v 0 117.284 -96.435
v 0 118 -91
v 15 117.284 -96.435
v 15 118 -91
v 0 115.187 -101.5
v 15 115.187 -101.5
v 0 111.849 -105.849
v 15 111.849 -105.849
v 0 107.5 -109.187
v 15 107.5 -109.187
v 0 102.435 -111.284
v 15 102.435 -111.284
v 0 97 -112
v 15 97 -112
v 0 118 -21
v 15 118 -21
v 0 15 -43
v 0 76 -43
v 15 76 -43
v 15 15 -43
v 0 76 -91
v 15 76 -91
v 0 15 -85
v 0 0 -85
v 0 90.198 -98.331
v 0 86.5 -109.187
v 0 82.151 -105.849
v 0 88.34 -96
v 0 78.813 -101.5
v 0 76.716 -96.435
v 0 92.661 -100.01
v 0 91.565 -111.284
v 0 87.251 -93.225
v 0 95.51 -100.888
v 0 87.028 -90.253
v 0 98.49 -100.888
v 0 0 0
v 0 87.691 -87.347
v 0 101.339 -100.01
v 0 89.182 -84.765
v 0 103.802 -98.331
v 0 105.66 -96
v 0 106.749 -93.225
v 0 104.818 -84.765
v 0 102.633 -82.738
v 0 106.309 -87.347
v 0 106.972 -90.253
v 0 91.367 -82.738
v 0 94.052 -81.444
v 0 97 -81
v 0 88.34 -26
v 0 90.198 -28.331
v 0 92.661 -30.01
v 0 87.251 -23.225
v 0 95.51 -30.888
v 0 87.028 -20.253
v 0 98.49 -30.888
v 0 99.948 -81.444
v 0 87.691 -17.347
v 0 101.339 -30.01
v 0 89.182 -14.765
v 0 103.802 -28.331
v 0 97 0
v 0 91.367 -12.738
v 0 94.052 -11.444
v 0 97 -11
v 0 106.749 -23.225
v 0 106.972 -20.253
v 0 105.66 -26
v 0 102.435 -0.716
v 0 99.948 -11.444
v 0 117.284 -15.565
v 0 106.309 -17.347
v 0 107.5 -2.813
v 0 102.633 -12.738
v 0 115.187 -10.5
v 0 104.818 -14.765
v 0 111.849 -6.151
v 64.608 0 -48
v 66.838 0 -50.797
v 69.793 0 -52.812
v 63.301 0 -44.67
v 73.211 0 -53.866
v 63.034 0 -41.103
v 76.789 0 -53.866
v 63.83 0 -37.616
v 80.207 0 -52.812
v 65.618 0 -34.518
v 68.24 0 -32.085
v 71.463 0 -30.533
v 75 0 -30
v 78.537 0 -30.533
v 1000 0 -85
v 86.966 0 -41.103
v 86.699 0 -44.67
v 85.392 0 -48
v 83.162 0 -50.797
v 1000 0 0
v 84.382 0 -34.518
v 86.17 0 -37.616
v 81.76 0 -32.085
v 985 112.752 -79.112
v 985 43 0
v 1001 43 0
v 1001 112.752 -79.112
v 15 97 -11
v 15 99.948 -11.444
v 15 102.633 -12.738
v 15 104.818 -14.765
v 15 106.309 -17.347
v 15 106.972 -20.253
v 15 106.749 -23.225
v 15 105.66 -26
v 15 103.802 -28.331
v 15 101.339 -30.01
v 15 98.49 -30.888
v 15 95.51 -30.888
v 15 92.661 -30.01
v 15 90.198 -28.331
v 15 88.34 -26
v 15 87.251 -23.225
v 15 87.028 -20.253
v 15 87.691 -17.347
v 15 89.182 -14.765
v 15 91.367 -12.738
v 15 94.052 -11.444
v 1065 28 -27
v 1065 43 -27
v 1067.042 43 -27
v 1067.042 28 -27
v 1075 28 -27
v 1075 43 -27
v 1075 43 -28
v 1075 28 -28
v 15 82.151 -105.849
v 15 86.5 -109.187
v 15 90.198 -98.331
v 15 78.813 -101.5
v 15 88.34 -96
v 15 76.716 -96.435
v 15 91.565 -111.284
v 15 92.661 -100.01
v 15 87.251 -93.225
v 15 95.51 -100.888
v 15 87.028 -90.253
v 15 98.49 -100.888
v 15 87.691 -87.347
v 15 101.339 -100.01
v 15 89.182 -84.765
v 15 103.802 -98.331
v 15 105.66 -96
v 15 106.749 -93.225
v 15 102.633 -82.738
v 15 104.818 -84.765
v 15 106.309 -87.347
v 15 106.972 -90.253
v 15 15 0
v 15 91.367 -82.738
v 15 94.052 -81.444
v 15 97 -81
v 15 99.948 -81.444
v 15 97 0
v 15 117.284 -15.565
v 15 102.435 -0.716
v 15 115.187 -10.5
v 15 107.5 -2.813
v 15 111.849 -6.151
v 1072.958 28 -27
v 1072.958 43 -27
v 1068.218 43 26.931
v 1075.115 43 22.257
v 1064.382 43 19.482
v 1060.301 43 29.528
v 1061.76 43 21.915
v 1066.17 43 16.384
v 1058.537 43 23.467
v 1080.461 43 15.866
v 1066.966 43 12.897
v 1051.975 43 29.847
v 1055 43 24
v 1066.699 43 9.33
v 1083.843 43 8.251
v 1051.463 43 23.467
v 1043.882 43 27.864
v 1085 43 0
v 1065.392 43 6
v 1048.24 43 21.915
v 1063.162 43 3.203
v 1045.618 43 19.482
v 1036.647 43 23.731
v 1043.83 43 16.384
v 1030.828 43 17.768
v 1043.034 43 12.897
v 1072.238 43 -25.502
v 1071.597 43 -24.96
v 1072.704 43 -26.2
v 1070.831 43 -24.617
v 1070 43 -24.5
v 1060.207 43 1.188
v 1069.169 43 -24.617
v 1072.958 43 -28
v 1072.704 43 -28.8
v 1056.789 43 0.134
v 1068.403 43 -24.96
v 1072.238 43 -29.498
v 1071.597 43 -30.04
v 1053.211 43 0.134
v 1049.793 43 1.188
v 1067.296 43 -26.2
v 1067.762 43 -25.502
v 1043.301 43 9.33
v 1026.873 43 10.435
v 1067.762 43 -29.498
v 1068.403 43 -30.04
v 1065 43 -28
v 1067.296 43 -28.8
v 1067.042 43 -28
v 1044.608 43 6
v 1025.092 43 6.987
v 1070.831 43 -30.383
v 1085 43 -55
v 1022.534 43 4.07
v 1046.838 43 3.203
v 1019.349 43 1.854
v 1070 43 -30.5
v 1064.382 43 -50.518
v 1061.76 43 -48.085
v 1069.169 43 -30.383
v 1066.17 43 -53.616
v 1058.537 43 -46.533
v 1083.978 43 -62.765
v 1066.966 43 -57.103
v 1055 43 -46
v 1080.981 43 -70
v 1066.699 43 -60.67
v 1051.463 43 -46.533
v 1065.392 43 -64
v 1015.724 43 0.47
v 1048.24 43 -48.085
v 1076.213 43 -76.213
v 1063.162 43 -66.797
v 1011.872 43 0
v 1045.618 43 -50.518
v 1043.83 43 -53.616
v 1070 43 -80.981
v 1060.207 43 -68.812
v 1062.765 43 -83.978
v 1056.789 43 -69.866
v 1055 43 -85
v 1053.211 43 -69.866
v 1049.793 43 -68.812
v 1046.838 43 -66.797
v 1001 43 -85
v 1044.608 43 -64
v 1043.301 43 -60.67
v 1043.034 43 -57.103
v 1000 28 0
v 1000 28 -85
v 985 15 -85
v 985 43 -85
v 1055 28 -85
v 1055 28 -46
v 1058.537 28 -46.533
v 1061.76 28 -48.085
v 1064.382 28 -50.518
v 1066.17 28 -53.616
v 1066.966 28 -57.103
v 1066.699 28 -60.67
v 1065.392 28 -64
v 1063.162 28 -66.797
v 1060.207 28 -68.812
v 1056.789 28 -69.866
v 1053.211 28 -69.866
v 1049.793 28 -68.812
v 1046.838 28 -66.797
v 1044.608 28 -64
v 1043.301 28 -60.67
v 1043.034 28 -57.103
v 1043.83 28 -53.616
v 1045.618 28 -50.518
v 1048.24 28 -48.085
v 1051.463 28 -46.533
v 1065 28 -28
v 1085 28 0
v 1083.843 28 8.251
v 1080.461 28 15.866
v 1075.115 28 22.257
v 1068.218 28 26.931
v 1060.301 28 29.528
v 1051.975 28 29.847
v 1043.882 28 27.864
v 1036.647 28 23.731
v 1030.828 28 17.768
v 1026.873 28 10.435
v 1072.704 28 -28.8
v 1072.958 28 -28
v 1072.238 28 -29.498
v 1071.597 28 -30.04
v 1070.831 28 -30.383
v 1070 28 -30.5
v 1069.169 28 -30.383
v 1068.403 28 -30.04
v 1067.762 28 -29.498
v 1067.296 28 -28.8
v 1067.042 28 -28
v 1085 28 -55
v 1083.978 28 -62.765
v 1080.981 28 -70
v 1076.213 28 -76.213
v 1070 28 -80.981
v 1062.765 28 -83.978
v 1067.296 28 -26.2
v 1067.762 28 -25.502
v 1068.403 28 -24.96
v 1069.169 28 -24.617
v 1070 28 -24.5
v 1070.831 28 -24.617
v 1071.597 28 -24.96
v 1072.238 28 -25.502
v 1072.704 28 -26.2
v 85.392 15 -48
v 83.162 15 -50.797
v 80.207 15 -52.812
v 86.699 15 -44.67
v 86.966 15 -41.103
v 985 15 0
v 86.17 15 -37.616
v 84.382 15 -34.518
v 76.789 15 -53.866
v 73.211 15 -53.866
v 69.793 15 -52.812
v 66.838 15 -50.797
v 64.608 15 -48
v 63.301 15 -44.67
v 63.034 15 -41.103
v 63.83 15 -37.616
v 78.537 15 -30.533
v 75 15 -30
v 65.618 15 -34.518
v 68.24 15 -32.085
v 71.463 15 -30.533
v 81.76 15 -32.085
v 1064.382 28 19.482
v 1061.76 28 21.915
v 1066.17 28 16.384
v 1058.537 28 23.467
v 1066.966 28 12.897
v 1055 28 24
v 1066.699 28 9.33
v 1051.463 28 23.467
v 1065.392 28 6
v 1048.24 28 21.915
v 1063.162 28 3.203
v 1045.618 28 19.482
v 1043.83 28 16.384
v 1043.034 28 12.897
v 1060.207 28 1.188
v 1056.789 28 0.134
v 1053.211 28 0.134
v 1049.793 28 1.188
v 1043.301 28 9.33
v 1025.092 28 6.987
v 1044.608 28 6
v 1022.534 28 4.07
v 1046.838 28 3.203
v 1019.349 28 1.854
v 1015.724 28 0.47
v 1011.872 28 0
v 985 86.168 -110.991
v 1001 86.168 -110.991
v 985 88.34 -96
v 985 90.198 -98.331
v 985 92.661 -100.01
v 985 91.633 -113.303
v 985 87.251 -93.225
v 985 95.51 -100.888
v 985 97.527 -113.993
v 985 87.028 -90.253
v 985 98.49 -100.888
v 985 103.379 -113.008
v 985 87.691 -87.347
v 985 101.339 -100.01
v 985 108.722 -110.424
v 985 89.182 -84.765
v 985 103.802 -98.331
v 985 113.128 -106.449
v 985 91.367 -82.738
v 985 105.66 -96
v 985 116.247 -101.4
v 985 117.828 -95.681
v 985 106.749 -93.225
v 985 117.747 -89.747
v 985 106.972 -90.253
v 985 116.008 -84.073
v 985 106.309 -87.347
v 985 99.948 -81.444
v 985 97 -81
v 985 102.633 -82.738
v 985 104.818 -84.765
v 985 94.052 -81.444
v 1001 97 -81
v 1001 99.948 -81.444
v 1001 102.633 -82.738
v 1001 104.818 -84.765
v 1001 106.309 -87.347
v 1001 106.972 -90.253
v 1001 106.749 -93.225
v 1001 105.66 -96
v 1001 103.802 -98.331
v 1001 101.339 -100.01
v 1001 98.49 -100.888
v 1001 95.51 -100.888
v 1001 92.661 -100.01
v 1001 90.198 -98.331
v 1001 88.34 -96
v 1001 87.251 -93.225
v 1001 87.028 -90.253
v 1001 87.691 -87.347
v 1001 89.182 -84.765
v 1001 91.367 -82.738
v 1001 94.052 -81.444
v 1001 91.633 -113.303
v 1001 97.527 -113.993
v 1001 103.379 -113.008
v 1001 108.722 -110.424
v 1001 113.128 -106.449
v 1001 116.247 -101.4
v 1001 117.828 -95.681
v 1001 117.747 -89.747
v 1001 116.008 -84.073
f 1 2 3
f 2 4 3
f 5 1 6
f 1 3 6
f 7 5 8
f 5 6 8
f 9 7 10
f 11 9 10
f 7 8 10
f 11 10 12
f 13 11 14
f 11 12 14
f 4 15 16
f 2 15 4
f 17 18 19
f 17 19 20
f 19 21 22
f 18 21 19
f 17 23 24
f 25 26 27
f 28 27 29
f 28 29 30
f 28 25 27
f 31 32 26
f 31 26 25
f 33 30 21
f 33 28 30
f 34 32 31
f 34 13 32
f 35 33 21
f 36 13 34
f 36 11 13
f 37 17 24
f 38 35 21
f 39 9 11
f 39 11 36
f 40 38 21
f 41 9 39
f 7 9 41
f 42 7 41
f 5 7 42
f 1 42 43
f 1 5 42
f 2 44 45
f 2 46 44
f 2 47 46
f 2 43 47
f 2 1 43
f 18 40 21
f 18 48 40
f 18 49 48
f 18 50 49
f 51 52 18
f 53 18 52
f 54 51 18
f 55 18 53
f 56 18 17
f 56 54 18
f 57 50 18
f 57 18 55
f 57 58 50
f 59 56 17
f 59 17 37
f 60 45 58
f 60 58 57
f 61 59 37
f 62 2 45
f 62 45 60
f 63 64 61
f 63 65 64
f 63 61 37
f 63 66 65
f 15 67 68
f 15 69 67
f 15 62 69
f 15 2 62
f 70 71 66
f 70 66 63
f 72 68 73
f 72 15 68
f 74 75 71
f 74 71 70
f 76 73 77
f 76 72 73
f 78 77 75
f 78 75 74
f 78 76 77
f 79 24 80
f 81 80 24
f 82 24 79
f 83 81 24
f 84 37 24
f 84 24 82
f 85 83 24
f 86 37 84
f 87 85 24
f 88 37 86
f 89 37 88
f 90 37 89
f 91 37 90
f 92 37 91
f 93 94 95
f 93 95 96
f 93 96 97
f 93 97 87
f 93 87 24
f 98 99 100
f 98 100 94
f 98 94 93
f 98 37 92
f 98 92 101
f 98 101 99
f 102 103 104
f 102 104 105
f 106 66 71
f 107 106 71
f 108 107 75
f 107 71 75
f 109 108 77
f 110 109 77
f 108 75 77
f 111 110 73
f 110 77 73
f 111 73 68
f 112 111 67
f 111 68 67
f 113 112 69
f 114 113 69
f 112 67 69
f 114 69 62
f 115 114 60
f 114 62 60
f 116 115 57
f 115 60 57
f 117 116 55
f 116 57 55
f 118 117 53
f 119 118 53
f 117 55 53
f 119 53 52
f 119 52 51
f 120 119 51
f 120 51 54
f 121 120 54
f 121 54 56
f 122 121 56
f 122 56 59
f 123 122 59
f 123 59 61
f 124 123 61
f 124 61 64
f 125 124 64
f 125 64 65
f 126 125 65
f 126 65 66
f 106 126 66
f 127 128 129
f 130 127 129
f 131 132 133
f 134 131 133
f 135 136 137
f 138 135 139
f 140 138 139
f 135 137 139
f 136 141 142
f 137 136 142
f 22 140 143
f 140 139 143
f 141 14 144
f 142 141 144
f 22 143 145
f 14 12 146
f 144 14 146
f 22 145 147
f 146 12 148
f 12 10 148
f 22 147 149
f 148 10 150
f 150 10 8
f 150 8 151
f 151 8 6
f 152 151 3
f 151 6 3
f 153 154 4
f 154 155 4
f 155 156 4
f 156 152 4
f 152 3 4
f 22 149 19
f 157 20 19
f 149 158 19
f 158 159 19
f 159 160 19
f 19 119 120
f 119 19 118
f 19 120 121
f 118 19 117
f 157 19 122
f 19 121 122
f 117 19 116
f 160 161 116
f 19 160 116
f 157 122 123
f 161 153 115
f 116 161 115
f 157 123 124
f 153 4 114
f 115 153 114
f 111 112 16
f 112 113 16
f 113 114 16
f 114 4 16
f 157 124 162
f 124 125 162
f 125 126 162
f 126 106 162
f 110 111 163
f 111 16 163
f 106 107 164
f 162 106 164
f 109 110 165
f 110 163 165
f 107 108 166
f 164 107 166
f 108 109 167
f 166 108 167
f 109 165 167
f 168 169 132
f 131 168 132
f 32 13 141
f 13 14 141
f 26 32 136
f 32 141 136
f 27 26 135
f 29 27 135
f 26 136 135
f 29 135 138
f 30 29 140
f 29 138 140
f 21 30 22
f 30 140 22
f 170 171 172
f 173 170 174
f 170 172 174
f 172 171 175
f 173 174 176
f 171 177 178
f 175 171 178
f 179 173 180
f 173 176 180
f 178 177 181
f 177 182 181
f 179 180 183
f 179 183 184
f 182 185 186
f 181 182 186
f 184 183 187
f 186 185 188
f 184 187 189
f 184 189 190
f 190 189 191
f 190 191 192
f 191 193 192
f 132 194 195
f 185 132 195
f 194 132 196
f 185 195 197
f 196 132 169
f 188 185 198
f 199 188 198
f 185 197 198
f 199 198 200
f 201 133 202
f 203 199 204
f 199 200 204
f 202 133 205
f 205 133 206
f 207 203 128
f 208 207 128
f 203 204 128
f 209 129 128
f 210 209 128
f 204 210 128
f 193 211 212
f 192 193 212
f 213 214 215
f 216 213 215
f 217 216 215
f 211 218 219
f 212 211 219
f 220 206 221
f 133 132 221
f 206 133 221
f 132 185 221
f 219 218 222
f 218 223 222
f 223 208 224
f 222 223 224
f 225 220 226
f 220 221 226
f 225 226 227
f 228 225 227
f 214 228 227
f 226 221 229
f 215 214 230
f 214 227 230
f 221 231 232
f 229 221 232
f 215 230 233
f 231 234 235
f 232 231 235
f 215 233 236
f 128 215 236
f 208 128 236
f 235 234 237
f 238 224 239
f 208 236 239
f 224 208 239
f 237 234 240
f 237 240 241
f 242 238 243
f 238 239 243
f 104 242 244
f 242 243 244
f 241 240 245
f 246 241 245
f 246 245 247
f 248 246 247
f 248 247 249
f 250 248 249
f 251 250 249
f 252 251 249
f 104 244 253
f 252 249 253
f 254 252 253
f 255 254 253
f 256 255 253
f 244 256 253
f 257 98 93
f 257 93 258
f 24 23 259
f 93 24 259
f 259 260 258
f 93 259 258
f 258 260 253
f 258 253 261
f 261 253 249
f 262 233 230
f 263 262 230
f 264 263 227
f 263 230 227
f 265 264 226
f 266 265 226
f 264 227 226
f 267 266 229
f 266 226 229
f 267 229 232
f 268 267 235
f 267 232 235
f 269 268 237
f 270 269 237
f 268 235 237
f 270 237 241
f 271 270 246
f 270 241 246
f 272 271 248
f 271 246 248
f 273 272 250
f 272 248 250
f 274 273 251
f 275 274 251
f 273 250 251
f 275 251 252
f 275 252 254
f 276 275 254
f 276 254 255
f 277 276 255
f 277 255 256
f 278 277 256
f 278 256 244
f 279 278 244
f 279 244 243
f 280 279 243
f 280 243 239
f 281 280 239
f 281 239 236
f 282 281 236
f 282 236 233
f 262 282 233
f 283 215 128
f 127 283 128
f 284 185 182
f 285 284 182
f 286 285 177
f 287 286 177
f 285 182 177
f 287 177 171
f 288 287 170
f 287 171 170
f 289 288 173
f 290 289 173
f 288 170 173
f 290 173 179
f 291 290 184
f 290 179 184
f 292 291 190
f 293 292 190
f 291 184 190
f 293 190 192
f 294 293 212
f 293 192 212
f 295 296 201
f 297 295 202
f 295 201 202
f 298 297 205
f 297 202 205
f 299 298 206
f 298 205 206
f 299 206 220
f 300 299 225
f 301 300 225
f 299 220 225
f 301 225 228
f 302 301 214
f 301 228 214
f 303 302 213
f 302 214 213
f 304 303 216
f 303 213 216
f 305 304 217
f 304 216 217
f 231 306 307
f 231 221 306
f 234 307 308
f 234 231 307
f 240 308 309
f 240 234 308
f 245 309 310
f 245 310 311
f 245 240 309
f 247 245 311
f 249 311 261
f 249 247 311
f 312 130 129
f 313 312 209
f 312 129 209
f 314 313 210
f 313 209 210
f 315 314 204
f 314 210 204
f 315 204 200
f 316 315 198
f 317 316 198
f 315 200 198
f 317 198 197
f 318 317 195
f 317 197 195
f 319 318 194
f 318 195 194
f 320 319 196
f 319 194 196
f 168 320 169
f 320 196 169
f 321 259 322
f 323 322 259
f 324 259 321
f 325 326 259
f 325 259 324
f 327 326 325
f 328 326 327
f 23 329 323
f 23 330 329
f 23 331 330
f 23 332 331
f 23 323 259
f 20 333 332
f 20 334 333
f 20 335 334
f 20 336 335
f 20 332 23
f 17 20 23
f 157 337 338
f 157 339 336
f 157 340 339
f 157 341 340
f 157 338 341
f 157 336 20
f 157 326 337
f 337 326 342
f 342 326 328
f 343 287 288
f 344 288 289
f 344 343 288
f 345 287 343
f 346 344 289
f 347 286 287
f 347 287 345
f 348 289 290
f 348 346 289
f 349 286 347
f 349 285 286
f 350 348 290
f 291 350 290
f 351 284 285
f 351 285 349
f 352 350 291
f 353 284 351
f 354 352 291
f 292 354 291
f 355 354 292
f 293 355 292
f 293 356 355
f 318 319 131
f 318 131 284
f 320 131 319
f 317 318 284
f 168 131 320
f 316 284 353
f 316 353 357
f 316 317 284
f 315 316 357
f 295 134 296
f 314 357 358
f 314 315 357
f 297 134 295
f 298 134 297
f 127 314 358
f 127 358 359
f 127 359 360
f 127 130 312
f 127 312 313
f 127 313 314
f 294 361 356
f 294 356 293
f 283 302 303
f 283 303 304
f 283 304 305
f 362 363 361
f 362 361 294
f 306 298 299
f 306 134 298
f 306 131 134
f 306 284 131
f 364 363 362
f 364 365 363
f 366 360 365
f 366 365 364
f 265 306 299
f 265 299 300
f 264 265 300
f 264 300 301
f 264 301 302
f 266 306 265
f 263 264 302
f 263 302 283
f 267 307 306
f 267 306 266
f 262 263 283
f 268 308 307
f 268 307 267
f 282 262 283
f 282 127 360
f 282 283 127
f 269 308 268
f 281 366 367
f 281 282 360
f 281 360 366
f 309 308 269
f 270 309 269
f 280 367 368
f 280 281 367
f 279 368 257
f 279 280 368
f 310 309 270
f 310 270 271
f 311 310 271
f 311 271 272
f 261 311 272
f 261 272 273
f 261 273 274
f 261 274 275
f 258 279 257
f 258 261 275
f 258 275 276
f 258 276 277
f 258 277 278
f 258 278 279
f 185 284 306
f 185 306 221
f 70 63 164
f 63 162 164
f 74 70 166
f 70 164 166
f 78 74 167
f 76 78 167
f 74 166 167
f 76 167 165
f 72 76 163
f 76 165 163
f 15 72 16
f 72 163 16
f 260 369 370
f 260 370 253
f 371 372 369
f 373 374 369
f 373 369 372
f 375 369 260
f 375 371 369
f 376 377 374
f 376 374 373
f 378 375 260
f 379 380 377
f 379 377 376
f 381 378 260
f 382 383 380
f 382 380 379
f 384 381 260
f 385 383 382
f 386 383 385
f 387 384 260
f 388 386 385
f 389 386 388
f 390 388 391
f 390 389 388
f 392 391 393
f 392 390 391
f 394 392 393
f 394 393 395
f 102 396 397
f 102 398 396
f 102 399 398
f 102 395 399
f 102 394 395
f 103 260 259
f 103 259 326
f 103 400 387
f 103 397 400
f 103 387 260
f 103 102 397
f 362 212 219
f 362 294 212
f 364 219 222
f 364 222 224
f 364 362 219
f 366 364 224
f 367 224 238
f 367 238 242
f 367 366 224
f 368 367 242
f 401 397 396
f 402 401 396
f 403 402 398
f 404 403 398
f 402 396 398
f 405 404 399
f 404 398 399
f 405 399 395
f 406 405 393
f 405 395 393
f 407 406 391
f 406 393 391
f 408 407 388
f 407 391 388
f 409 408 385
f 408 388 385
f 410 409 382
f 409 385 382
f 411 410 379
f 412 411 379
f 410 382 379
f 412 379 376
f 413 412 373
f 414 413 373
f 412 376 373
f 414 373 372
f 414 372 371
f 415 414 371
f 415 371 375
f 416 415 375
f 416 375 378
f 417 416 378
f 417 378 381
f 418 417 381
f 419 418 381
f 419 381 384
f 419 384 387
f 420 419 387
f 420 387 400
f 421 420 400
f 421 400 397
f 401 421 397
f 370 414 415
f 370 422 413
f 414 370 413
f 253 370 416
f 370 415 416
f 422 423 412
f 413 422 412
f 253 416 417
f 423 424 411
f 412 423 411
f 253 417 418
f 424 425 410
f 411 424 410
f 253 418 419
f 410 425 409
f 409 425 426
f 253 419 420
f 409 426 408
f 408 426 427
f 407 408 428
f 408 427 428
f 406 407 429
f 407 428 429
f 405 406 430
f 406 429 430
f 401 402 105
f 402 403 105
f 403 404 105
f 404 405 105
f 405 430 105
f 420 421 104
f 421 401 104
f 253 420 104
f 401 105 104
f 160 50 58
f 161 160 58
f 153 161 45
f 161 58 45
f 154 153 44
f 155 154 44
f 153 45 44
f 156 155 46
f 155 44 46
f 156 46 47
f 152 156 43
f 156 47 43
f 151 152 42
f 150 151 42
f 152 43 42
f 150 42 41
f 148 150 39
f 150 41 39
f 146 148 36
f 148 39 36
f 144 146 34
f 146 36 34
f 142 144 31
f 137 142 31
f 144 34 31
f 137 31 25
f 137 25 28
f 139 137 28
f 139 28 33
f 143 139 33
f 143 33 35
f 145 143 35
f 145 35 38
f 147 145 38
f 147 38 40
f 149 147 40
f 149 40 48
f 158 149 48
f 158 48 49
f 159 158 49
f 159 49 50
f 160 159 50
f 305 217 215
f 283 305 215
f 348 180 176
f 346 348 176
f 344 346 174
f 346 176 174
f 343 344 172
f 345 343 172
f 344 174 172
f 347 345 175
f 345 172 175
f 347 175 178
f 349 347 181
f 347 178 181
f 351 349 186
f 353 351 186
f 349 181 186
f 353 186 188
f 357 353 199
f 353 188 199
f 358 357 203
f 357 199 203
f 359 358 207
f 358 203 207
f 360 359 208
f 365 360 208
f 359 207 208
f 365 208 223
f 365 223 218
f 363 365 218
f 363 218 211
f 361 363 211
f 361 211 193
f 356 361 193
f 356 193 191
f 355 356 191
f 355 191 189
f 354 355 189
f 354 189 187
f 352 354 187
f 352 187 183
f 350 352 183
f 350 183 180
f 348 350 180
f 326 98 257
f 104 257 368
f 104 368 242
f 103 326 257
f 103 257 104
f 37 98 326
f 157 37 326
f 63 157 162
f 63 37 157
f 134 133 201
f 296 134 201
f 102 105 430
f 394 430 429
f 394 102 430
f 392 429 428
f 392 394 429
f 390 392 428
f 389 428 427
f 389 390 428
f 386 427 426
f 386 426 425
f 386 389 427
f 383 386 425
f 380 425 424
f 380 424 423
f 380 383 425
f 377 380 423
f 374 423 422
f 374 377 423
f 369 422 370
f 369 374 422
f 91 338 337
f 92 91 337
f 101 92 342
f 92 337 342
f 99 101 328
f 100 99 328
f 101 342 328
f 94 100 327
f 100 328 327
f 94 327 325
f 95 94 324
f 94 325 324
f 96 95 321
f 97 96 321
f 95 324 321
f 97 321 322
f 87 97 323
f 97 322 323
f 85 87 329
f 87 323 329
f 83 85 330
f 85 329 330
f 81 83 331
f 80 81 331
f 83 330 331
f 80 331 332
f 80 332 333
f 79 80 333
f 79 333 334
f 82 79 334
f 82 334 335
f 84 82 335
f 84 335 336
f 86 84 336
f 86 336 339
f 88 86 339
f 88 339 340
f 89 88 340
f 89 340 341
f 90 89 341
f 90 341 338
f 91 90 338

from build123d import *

# Parameters (mm, degrees)
EXTRUDE_THIN1_DEPTH = 85
BOSS_EXTRUDE1_DEPTH = 15
BOSS_EXTRUDE2_DEPTH = 16
FILLET1_R           = 21
BOSS_EXTRUDE3_DEPTH = 15
FILLET2_R           = 16
SKETCH6_R           = 12
CUT_EXTRUDE2_DEPTH  = 1094.547438386
FILLET3_R           = 30
SKETCH7_R           = 12
CUT_EXTRUDE3_DEPTH  = 1096.823890961
SKETCH9_R           = 10
CUT_EXTRUDE4_DEPTH  = 1098.335409071
CUT_EXTRUDE5_DEPTH  = 1094.547438386


with BuildPart() as part:
    # Sketch1 → Extrude-Thin1 (new body)
    with BuildSketch(Plane.XY):
        Polygon((0, 0), (1000, 0), (1000, 28), (1085, 28), (1085, 43), (985, 43), (985, 15), (0, 15), align=None)
    extrude(amount=-EXTRUDE_THIN1_DEPTH)

    # Sketch2 → Boss-Extrude1 (add)
    with BuildSketch(Plane.ZY):
        Polygon((0, 15), (0, 118), (-112, 118), (-112, 76), (-43, 76), (-43, 15), align=None)
    extrude(amount=-BOSS_EXTRUDE1_DEPTH)

    # Sketch3 → Boss-Extrude2 (add)
    with BuildSketch(Plane.ZY.offset(-985)):
        with BuildLine():
            Line((0, 43), (-79.111854281, 112.751806515))
            ThreePointArc((-79.111854281, 112.751806515), (-106.449245092, 113.128168106), (-110.990788091, 86.168031394))
            Line((-110.990788091, 86.168031394), (-85, 43))
            Line((-85, 43), (0, 43))
        make_face()
    extrude(amount=-BOSS_EXTRUDE2_DEPTH)

    # Fillet1
    fillet1_edges = [part.edges().sort_by_distance(p)[0] for p in [
        (7.5, 76, -112),
        (7.5, 118, -112),
        (7.5, 118, 0),
    ]]
    fillet(fillet1_edges, radius=FILLET1_R - 0.0001)  # a hair under: the kernel refuses the full size

    # Sketch5 → Boss-Extrude3 (add)
    with BuildSketch(Plane(origin=(0, 43, 0), x_dir=(1, 0, 0), z_dir=(0, 1, 0))):
        with BuildLine():
            Line((1025, 0), (1085, 0))
            ThreePointArc((1085, 0), (1055, -30), (1025, 0))
        make_face()
    extrude(amount=-BOSS_EXTRUDE3_DEPTH)

    # Fillet2
    fillet2_edges = [part.edges().sort_by_distance(p)[0] for p in [
        (1025, 35.5, 0),
    ]]
    fillet(fillet2_edges, radius=FILLET2_R)

    # Sketch6 → Cut-Extrude2 (cut, through all)
    with BuildSketch(Plane(origin=(0, 43, 0), x_dir=(1, 0, 0), z_dir=(0, 1, 0))):
        with Locations(Location((1055, -12, 0), (0, 0, 270))):
            Circle(SKETCH6_R)
        with Locations(Location((1055, 58, 0), (0, 0, 270))):
            Circle(SKETCH6_R)
    extrude(amount=-CUT_EXTRUDE2_DEPTH, mode=Mode.SUBTRACT)

    # Fillet3
    fillet3_edges = [part.edges().sort_by_distance(p)[0] for p in [
        (1085, 35.5, -85),
    ]]
    fillet(fillet3_edges, radius=FILLET3_R)

    # Sketch7 → Cut-Extrude3 (cut, through all)
    with BuildSketch(Plane(origin=(0, 15, 0), x_dir=(1, 0, 0), z_dir=(0, 1, 0))):
        with Locations(Location((75, 42, 0), (0, 0, 270))):
            Circle(SKETCH7_R)
    extrude(amount=-CUT_EXTRUDE3_DEPTH, mode=Mode.SUBTRACT)

    # Sketch9 → Cut-Extrude4 (cut, through all)
    with BuildSketch(Plane.ZY):
        with Locations((-91, 97)):
            Circle(SKETCH9_R)
        with Locations((-21, 97)):
            Circle(SKETCH9_R)
    extrude(amount=-CUT_EXTRUDE4_DEPTH, mode=Mode.SUBTRACT)

    # Sketch10 → Cut-Extrude5 (cut, through all)
    with BuildSketch(Plane(origin=(0, 43, 0), x_dir=(1, 0, 0), z_dir=(0, 1, 0))):
        with BuildLine():
            Line((1067.041960108, 28), (1072.958039892, 28))
            ThreePointArc((1072.958039892, 28), (1070, 30.5), (1067.041960108, 28))
        make_face()
        with BuildLine():
            ThreePointArc((1067.041960108, 27), (1070, 24.5), (1072.958039892, 27))
            Line((1072.958039892, 27), (1067.041960108, 27))
        make_face()
        with BuildLine():
            Line((1075, 27), (1075, 28))
            Line((1075, 28), (1072.958039892, 28))
            ThreePointArc((1072.958039892, 28), (1072.989491568, 27.750878781), (1073, 27.5))
            ThreePointArc((1073, 27.5), (1072.989491568, 27.249121219), (1072.958039892, 27))
            Line((1072.958039892, 27), (1075, 27))
        make_face()
        with BuildLine():
            ThreePointArc((1067.041960108, 27), (1067, 27.5), (1067.041960108, 28))
            Line((1067.041960108, 28), (1065, 28))
            Line((1065, 28), (1065, 27))
            Line((1065, 27), (1067.041960108, 27))
        make_face()
        with BuildLine():
            ThreePointArc((1073, 27.5), (1072.989491568, 27.750878781), (1072.958039892, 28))
            Line((1072.958039892, 28), (1067.041960108, 28))
            ThreePointArc((1067.041960108, 28), (1067, 27.5), (1067.041960108, 27))
            Line((1067.041960108, 27), (1072.958039892, 27))
            ThreePointArc((1072.958039892, 27), (1072.989491568, 27.249121219), (1073, 27.5))
        make_face()
    extrude(amount=-CUT_EXTRUDE5_DEPTH, mode=Mode.SUBTRACT)


solid = part.part
